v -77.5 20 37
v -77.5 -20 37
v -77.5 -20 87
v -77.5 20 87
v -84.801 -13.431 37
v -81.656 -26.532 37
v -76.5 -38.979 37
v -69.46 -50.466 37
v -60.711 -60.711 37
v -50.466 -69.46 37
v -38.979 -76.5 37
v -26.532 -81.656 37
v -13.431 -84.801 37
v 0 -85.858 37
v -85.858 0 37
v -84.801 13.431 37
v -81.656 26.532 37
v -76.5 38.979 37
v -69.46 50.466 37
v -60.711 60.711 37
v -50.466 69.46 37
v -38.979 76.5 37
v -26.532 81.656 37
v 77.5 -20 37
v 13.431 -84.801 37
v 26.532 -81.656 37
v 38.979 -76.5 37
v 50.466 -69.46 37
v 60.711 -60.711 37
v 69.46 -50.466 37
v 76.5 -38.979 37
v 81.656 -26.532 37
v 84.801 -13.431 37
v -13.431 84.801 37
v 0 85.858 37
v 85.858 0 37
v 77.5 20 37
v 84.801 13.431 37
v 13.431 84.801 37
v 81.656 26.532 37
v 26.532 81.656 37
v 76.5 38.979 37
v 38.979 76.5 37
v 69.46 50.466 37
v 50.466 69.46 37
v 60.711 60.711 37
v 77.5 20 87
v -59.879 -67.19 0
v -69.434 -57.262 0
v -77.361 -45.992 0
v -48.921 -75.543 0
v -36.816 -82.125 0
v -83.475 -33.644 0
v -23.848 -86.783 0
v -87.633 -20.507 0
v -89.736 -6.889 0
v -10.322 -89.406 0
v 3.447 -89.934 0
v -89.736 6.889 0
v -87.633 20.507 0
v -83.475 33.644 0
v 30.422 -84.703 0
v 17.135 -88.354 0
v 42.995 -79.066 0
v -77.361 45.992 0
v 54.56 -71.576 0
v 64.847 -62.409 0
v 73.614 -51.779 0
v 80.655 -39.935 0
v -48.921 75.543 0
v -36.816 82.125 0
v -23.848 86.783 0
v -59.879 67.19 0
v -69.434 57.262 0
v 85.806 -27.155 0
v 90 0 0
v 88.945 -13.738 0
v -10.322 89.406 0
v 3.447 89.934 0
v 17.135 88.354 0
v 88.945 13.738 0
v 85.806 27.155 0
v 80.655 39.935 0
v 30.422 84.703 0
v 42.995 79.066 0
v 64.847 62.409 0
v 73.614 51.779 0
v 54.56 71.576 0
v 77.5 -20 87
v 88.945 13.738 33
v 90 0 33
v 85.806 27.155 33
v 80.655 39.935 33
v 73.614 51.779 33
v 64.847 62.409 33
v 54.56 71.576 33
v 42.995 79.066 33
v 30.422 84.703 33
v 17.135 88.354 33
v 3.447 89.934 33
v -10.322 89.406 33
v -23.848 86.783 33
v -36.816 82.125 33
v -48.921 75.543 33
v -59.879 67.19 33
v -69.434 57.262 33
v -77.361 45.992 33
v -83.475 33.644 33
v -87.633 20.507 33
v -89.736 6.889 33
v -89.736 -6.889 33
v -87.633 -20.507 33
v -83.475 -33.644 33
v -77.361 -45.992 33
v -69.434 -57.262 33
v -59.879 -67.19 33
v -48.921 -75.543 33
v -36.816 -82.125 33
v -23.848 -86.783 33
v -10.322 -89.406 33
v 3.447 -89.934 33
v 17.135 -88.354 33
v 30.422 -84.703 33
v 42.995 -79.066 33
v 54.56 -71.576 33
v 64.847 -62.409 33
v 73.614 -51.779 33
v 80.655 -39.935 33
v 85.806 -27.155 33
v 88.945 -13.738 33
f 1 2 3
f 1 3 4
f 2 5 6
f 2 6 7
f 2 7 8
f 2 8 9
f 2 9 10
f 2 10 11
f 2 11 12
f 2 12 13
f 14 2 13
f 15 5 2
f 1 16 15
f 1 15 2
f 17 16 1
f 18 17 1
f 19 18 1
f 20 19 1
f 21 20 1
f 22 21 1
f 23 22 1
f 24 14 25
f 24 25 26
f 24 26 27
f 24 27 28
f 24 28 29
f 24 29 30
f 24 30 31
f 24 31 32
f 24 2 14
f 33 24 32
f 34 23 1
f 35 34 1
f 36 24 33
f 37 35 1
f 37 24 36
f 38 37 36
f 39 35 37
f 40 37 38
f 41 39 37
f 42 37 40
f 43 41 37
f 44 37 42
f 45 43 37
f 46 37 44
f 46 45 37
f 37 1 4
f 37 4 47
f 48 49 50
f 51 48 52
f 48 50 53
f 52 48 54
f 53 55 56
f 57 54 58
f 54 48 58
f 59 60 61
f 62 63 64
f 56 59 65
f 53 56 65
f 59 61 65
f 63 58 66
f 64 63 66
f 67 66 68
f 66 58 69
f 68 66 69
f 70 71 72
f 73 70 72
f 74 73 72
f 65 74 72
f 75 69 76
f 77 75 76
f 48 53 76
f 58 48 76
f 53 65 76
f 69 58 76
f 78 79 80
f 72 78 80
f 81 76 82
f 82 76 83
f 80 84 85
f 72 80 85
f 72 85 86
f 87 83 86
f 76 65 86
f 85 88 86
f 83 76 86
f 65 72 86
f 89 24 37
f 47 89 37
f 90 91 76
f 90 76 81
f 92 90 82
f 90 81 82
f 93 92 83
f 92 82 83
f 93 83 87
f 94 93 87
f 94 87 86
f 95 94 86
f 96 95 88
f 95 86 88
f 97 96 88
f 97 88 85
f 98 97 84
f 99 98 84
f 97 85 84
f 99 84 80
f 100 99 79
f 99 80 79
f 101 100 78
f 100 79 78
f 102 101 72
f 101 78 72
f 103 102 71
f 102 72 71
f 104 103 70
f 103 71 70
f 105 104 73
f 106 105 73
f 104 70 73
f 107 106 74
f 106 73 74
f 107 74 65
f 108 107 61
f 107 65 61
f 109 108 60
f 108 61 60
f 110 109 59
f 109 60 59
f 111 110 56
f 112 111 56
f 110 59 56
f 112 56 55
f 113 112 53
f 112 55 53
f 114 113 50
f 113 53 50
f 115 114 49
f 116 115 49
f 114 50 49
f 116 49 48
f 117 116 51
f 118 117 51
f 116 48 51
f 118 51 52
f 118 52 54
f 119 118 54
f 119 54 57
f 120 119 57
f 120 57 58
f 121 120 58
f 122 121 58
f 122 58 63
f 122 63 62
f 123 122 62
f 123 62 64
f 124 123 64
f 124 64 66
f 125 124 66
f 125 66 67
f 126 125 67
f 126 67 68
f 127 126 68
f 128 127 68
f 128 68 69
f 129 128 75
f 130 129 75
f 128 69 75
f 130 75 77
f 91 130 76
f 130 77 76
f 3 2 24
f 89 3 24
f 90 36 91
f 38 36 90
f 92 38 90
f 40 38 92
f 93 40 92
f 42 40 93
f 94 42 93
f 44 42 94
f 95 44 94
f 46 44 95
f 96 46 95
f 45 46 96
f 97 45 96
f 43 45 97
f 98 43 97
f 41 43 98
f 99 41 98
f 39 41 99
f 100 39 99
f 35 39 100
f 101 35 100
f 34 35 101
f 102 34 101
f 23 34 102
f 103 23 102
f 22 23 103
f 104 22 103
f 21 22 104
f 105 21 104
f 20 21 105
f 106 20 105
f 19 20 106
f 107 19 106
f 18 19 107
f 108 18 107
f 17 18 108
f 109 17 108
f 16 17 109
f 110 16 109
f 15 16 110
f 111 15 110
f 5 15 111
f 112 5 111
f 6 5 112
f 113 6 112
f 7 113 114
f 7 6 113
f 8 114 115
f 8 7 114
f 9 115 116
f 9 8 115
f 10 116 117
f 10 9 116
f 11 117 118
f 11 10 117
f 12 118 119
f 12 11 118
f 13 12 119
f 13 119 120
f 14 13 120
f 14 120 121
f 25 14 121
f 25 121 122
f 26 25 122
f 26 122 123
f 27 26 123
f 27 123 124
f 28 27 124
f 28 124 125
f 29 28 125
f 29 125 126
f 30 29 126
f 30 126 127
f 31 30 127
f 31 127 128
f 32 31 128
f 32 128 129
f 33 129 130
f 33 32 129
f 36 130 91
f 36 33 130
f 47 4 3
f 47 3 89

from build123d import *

# Parameters (mm, degrees)
SKETCH3_R           = 90
BOSS_EXTRUDE1_DEPTH = 37
CHAMFER1_SIZE       = 4
CHAMFER1_SIZE2      = 4.142121255
SKETCH4_W           = 155
SKETCH4_H           = 40
BOSS_EXTRUDE2_DEPTH = 50


with BuildPart() as part:
    # Sketch3 → Boss-Extrude1 (new body)
    with BuildSketch(Plane.XY):
        Circle(SKETCH3_R)
    extrude(amount=BOSS_EXTRUDE1_DEPTH)

    # Chamfer1
    chamfer1_edges = [part.edges().sort_by_distance(p)[0] for p in [
        (-90, 0, 37),
    ]]
    chamfer1_side = [part.faces().sort_by_distance(p)[0] for p in [
        (-90, 0, 18.5),
    ]]
    chamfer(chamfer1_edges, length=CHAMFER1_SIZE, length2=CHAMFER1_SIZE2, reference=chamfer1_side[0])

    # Sketch4 → Boss-Extrude2 (add)
    with BuildSketch(Plane.XY.offset(37)):
        Rectangle(SKETCH4_W, SKETCH4_H)
    extrude(amount=BOSS_EXTRUDE2_DEPTH)


solid = part.part
